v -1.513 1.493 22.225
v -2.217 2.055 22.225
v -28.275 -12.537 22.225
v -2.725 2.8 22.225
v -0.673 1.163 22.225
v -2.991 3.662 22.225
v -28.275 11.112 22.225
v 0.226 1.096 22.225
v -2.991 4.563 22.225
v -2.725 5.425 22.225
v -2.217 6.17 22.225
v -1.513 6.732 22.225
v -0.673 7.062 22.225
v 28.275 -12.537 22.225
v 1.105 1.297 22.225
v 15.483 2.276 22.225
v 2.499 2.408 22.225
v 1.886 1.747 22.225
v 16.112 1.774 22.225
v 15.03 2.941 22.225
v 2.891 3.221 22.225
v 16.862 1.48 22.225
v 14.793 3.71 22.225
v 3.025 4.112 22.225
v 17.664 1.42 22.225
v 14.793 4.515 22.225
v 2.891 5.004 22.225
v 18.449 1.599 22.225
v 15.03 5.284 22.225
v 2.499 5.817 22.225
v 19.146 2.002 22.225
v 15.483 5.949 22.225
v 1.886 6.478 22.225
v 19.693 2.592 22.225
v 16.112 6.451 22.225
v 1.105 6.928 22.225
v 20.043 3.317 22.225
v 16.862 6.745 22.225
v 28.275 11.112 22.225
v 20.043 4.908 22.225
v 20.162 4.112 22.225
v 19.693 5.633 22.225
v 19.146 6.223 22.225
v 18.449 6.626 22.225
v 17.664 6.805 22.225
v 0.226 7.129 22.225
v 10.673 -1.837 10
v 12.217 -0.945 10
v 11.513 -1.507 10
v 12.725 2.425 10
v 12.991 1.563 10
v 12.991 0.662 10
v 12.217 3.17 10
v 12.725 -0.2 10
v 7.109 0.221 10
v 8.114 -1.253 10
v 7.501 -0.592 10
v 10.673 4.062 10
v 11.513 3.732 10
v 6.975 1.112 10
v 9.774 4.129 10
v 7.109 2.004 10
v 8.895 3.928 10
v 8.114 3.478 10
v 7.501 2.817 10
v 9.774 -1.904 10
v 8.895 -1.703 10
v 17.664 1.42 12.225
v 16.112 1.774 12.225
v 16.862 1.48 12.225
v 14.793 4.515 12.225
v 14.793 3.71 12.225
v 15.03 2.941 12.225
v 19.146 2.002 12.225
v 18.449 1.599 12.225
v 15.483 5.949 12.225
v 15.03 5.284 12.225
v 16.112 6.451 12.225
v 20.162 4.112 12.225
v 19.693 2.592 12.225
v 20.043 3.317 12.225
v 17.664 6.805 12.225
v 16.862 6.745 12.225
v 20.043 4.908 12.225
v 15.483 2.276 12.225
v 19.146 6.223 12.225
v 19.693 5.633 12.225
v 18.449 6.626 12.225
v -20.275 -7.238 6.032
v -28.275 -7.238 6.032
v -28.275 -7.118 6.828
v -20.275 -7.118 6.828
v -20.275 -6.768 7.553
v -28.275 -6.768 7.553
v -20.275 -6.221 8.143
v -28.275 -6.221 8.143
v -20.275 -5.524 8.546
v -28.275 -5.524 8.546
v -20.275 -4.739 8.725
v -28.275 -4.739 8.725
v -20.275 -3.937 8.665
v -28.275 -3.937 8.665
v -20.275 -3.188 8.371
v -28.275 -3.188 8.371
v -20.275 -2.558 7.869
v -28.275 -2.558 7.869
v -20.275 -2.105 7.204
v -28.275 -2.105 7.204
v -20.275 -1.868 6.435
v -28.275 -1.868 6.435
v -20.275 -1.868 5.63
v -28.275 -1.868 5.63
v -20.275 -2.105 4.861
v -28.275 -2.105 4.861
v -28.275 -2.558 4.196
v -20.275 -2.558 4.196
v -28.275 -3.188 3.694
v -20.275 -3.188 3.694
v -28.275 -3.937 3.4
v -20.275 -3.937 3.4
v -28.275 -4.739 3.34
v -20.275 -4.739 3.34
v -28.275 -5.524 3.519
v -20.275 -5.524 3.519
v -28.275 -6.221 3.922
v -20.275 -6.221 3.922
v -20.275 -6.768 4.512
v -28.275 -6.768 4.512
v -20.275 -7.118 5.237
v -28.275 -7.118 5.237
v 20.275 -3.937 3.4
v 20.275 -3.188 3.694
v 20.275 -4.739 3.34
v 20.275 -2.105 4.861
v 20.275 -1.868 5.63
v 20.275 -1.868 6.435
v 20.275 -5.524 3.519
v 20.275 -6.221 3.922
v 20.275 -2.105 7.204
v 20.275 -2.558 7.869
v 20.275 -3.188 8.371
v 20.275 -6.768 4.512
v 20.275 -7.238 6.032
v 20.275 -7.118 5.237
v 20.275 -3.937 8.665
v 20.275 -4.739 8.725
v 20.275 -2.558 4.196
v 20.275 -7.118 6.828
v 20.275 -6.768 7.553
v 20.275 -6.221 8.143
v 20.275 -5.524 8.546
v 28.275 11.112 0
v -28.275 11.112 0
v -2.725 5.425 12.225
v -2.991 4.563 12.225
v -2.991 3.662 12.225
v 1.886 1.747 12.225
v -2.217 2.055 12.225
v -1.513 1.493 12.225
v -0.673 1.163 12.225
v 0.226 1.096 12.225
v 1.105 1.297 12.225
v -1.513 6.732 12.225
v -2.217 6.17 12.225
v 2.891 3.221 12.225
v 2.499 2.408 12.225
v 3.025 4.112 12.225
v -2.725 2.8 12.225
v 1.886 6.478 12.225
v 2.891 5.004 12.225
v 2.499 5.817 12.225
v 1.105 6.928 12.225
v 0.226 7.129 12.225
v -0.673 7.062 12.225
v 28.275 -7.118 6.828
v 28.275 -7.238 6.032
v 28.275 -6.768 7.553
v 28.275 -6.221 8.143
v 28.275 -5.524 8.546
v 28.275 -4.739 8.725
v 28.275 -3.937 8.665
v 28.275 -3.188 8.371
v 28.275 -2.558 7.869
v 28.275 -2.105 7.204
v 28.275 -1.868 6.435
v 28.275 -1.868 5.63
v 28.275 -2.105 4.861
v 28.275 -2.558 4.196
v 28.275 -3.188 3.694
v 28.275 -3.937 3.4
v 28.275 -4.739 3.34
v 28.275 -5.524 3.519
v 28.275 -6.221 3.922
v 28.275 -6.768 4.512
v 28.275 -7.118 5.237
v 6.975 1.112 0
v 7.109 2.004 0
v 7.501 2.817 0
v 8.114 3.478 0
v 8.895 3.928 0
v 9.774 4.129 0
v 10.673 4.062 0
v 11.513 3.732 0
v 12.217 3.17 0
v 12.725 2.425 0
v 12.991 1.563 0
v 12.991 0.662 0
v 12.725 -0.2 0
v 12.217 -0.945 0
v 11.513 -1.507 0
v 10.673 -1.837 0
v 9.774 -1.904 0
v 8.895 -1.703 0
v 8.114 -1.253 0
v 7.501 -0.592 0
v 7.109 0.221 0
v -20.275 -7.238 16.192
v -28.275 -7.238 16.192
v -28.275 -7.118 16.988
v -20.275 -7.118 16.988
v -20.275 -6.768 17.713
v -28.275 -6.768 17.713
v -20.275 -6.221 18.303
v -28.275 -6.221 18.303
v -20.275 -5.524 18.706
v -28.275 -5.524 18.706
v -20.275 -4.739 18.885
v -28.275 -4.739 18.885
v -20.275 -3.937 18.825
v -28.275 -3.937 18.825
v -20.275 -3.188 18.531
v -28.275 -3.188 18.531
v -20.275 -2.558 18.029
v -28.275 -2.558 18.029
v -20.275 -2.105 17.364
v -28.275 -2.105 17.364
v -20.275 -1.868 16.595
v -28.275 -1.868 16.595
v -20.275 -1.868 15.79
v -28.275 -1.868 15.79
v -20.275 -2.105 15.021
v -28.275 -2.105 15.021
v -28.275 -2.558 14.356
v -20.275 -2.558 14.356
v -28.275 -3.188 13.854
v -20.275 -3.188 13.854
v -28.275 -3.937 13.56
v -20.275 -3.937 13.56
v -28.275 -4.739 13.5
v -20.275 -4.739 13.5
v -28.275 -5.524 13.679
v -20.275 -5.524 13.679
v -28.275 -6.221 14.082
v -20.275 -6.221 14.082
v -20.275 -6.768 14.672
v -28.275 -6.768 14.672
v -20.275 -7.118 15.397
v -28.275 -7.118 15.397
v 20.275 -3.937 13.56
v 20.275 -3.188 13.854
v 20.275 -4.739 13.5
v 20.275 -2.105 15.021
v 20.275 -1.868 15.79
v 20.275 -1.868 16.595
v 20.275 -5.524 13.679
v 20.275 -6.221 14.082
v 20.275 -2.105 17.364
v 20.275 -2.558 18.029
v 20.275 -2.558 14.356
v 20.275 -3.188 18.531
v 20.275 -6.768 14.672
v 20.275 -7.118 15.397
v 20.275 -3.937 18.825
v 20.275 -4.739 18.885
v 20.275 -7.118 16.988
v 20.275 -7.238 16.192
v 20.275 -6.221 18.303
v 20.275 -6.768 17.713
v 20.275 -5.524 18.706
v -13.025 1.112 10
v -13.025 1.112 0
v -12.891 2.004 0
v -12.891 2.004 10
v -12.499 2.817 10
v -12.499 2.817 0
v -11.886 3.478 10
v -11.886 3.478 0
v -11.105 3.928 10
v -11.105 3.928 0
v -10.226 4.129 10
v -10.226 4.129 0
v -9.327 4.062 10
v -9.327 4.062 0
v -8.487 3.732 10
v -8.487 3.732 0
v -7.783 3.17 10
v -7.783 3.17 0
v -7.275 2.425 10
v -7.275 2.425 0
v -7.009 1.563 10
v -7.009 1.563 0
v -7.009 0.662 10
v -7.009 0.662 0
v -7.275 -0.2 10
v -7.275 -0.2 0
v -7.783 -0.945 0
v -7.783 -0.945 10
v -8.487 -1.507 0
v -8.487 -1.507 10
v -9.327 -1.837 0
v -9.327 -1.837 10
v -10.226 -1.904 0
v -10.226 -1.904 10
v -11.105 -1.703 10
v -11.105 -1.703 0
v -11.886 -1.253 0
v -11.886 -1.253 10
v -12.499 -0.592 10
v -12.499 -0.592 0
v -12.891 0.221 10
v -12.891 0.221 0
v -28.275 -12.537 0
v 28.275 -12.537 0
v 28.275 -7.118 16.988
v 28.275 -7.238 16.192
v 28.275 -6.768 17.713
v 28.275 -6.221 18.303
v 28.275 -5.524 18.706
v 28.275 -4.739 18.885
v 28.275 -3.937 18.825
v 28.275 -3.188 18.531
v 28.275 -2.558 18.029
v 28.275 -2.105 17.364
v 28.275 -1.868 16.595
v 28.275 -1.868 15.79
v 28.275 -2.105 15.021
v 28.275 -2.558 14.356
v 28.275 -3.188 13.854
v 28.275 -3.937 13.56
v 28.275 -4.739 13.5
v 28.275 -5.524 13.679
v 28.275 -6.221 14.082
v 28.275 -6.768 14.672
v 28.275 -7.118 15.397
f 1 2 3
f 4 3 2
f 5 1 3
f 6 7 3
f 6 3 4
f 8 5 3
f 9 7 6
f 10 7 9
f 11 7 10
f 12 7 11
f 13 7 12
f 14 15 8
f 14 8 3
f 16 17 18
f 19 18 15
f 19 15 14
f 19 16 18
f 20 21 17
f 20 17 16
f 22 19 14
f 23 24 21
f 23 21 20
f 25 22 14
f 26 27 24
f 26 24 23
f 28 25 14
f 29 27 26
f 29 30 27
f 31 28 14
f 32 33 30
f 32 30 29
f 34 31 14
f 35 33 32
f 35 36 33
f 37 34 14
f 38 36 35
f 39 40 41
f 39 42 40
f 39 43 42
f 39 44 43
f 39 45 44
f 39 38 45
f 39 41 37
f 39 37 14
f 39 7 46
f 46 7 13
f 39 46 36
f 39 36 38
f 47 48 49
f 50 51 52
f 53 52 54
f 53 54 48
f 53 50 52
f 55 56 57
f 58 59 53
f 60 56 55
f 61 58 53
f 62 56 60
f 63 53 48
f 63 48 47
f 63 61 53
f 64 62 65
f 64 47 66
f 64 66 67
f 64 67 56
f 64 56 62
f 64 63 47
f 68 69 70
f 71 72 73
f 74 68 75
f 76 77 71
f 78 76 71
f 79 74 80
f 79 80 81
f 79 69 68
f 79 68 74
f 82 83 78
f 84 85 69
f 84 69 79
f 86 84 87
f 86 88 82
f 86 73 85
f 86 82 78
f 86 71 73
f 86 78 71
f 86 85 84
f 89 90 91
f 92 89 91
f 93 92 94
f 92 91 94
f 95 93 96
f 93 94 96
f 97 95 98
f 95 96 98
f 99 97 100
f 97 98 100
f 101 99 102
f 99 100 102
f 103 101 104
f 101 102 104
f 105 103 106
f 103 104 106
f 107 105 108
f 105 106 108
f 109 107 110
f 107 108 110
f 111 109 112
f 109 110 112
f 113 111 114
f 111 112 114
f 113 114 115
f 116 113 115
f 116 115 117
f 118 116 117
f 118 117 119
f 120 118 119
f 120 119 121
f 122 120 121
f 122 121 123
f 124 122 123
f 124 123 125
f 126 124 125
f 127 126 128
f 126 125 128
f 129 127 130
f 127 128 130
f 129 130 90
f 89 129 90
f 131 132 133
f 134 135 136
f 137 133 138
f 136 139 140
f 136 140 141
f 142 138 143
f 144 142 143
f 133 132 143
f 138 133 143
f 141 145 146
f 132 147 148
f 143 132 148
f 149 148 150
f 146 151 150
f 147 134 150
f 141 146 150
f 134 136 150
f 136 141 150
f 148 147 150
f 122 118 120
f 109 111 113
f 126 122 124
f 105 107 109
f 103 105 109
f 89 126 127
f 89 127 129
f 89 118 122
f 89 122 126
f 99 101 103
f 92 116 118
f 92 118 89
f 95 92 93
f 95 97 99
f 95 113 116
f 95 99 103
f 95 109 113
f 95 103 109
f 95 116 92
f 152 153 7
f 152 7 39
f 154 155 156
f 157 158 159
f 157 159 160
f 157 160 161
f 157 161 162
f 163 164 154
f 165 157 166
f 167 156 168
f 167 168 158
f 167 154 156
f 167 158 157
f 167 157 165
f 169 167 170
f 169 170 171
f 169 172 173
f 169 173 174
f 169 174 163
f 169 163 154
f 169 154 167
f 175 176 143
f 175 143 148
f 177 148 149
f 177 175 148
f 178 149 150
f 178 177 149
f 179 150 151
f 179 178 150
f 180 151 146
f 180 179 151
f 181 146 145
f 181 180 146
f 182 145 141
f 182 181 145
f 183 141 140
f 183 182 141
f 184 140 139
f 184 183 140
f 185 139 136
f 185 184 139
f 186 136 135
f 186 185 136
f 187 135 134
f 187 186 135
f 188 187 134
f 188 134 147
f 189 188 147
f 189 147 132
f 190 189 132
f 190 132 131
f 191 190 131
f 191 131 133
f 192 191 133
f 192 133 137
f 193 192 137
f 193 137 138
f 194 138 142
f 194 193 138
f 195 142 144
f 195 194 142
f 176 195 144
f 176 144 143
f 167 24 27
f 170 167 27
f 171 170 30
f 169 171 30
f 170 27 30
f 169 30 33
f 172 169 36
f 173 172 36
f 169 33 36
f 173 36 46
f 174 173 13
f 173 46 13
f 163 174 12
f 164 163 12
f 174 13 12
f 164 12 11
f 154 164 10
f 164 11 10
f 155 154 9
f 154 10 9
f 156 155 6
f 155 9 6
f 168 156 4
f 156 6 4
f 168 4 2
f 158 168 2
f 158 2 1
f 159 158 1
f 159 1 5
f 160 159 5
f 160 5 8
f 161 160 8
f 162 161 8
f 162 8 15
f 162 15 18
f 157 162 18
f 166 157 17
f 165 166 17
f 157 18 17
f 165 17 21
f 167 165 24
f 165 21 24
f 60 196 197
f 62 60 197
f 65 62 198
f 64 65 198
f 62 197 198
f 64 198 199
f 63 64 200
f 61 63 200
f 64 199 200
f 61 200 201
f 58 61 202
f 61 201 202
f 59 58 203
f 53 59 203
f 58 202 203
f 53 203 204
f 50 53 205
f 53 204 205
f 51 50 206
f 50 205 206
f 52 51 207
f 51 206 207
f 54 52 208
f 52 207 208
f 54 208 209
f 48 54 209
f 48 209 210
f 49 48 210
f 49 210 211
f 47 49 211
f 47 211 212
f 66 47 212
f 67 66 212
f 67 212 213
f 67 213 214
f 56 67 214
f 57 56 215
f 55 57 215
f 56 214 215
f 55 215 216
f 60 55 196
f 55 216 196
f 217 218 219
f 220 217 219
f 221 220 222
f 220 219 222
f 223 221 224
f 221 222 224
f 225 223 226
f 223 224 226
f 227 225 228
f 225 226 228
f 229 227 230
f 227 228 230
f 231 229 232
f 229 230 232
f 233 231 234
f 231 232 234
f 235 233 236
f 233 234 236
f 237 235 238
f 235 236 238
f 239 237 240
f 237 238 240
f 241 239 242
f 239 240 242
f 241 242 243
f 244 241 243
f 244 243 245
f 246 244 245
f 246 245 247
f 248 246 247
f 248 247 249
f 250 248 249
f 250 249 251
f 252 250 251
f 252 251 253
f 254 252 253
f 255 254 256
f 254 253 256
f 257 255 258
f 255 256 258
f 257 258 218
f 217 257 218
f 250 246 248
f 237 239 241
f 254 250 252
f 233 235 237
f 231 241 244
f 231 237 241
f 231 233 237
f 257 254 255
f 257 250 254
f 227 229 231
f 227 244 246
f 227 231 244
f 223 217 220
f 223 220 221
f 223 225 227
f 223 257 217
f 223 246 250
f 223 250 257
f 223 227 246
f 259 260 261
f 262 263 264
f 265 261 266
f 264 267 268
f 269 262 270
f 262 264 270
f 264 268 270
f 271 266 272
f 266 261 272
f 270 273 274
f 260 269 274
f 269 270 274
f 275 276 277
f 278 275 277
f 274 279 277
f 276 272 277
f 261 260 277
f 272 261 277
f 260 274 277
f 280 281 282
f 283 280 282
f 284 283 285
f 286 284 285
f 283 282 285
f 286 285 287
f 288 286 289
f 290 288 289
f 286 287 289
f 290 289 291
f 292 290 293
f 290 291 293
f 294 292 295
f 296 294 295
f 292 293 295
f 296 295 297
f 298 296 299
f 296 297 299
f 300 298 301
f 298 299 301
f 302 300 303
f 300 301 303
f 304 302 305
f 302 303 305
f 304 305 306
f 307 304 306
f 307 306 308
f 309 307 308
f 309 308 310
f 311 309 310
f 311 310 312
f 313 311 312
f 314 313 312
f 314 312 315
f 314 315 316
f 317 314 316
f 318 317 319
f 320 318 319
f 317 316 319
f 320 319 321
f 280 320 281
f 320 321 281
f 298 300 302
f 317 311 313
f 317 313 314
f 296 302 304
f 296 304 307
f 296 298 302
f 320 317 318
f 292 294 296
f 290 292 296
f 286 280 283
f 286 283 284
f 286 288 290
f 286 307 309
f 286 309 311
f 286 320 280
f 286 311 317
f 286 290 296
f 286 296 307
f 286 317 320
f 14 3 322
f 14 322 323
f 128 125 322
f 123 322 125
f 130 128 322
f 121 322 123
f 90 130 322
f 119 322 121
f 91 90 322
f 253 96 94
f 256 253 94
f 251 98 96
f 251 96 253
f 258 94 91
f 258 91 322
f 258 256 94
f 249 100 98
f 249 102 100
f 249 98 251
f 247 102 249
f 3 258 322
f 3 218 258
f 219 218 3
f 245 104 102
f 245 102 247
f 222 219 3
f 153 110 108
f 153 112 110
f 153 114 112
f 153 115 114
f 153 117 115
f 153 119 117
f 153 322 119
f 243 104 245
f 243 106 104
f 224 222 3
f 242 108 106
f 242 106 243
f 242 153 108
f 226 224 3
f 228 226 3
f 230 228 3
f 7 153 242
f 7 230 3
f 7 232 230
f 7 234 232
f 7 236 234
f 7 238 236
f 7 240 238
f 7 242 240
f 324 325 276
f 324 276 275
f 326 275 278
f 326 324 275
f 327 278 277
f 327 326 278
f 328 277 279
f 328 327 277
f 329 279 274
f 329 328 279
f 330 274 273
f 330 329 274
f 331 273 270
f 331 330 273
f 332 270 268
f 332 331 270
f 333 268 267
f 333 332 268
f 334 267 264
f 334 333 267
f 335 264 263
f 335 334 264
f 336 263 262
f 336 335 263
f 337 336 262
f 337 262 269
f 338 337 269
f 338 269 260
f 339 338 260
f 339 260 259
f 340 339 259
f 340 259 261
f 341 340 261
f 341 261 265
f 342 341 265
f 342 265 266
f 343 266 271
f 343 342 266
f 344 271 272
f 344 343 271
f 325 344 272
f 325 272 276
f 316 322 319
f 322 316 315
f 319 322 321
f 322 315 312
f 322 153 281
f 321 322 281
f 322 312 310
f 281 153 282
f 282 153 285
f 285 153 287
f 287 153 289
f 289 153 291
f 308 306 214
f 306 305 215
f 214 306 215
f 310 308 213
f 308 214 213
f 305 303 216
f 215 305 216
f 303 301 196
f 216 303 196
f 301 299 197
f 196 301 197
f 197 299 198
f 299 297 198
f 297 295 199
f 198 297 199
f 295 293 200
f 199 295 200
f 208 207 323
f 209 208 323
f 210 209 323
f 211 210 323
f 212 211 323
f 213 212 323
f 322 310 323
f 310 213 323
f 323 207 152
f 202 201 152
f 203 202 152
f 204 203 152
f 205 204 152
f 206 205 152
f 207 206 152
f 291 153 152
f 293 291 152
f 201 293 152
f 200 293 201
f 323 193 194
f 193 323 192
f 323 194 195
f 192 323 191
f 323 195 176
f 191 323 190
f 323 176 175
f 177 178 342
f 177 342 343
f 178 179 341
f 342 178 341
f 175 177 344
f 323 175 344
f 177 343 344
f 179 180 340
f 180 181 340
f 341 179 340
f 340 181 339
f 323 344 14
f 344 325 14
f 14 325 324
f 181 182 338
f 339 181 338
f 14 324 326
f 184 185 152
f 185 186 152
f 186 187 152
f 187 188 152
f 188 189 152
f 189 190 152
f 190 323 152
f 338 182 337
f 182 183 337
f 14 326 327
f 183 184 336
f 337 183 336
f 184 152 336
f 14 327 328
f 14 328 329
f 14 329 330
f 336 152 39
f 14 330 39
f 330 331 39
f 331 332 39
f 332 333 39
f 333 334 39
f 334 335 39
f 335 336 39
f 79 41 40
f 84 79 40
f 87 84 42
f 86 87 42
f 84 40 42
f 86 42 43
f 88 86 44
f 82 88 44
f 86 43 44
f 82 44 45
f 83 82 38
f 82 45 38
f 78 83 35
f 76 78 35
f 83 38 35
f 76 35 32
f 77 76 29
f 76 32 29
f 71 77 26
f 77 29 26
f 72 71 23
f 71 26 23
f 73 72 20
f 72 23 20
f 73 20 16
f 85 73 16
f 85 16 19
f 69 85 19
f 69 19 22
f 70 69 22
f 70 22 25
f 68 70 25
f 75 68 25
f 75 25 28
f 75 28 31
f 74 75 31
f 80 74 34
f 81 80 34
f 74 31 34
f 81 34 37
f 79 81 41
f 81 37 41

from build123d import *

# Parameters (mm, degrees)
SKETCH1_W           = 56.55
SKETCH1_H           = 22.225
BOSS_EXTRUDE1_DEPTH = 22.225
SKETCH2_R           = 2.7
SKETCH2_R_2         = 3.025
CUT_EXTRUDE1_DEPTH  = 10
SKETCH3_R           = 2.7
CUT_EXTRUDE2_DEPTH  = 8
SKETCH5_W           = 56.55
SKETCH5_H           = 22.225
BOSS_EXTRUDE2_DEPTH = 1.42494
SKETCH6_R           = 3.025
CUT_EXTRUDE3_DEPTH  = 10


with BuildPart() as part:
    # Sketch1 → Boss-Extrude1 (new body)
    with BuildSketch(Plane.XY):
        Rectangle(SKETCH1_W, SKETCH1_H)
    extrude(amount=BOSS_EXTRUDE1_DEPTH)

    # Sketch2 → Cut-Extrude1 (cut)
    with BuildSketch(Plane.XY.offset(22.225)):
        with Locations((17.4625, 4.1125)):
            Circle(SKETCH2_R)
        with Locations((0, 4.1125)):
            Circle(SKETCH2_R_2)
    extrude(amount=-CUT_EXTRUDE1_DEPTH, mode=Mode.SUBTRACT)

    # Sketch3 → Cut-Extrude2 (cut)
    with BuildSketch(Plane.ZY.offset(28.275)):
        with Locations(Location((16.1925, -4.5375001, 0), (0, 0, 270))):
            Circle(SKETCH3_R)
        with Locations(Location((6.0325, -4.5375001, 0), (0, 0, 270))):
            Circle(SKETCH3_R)
    cut_extrude2 = extrude(amount=-CUT_EXTRUDE2_DEPTH, mode=Mode.SUBTRACT)

    # Sketch5 → Boss-Extrude2 (add)
    with BuildSketch(Plane.XZ.offset(11.1125)):
        with Locations((0, 11.1125)):
            Rectangle(SKETCH5_W, SKETCH5_H)
    extrude(amount=BOSS_EXTRUDE2_DEPTH)

    # Mirror2: Cut-Extrude2 across plane
    add(cut_extrude2.mirror(Plane(origin=(0, 0, 0), x_dir=(0, 0, 1), z_dir=(1, 0, 0))), mode=Mode.SUBTRACT)

    # Sketch6 → Cut-Extrude3 (cut)
    with BuildSketch(Plane(origin=(0, 0, 0), x_dir=(-1, 0, 0), z_dir=(0, 0, -1))):
        with Locations((-10, 1.1125)):
            Circle(SKETCH6_R)
        with Locations((10, 1.1125)):
            Circle(SKETCH6_R)
    extrude(amount=-CUT_EXTRUDE3_DEPTH, mode=Mode.SUBTRACT)


solid = part.part
